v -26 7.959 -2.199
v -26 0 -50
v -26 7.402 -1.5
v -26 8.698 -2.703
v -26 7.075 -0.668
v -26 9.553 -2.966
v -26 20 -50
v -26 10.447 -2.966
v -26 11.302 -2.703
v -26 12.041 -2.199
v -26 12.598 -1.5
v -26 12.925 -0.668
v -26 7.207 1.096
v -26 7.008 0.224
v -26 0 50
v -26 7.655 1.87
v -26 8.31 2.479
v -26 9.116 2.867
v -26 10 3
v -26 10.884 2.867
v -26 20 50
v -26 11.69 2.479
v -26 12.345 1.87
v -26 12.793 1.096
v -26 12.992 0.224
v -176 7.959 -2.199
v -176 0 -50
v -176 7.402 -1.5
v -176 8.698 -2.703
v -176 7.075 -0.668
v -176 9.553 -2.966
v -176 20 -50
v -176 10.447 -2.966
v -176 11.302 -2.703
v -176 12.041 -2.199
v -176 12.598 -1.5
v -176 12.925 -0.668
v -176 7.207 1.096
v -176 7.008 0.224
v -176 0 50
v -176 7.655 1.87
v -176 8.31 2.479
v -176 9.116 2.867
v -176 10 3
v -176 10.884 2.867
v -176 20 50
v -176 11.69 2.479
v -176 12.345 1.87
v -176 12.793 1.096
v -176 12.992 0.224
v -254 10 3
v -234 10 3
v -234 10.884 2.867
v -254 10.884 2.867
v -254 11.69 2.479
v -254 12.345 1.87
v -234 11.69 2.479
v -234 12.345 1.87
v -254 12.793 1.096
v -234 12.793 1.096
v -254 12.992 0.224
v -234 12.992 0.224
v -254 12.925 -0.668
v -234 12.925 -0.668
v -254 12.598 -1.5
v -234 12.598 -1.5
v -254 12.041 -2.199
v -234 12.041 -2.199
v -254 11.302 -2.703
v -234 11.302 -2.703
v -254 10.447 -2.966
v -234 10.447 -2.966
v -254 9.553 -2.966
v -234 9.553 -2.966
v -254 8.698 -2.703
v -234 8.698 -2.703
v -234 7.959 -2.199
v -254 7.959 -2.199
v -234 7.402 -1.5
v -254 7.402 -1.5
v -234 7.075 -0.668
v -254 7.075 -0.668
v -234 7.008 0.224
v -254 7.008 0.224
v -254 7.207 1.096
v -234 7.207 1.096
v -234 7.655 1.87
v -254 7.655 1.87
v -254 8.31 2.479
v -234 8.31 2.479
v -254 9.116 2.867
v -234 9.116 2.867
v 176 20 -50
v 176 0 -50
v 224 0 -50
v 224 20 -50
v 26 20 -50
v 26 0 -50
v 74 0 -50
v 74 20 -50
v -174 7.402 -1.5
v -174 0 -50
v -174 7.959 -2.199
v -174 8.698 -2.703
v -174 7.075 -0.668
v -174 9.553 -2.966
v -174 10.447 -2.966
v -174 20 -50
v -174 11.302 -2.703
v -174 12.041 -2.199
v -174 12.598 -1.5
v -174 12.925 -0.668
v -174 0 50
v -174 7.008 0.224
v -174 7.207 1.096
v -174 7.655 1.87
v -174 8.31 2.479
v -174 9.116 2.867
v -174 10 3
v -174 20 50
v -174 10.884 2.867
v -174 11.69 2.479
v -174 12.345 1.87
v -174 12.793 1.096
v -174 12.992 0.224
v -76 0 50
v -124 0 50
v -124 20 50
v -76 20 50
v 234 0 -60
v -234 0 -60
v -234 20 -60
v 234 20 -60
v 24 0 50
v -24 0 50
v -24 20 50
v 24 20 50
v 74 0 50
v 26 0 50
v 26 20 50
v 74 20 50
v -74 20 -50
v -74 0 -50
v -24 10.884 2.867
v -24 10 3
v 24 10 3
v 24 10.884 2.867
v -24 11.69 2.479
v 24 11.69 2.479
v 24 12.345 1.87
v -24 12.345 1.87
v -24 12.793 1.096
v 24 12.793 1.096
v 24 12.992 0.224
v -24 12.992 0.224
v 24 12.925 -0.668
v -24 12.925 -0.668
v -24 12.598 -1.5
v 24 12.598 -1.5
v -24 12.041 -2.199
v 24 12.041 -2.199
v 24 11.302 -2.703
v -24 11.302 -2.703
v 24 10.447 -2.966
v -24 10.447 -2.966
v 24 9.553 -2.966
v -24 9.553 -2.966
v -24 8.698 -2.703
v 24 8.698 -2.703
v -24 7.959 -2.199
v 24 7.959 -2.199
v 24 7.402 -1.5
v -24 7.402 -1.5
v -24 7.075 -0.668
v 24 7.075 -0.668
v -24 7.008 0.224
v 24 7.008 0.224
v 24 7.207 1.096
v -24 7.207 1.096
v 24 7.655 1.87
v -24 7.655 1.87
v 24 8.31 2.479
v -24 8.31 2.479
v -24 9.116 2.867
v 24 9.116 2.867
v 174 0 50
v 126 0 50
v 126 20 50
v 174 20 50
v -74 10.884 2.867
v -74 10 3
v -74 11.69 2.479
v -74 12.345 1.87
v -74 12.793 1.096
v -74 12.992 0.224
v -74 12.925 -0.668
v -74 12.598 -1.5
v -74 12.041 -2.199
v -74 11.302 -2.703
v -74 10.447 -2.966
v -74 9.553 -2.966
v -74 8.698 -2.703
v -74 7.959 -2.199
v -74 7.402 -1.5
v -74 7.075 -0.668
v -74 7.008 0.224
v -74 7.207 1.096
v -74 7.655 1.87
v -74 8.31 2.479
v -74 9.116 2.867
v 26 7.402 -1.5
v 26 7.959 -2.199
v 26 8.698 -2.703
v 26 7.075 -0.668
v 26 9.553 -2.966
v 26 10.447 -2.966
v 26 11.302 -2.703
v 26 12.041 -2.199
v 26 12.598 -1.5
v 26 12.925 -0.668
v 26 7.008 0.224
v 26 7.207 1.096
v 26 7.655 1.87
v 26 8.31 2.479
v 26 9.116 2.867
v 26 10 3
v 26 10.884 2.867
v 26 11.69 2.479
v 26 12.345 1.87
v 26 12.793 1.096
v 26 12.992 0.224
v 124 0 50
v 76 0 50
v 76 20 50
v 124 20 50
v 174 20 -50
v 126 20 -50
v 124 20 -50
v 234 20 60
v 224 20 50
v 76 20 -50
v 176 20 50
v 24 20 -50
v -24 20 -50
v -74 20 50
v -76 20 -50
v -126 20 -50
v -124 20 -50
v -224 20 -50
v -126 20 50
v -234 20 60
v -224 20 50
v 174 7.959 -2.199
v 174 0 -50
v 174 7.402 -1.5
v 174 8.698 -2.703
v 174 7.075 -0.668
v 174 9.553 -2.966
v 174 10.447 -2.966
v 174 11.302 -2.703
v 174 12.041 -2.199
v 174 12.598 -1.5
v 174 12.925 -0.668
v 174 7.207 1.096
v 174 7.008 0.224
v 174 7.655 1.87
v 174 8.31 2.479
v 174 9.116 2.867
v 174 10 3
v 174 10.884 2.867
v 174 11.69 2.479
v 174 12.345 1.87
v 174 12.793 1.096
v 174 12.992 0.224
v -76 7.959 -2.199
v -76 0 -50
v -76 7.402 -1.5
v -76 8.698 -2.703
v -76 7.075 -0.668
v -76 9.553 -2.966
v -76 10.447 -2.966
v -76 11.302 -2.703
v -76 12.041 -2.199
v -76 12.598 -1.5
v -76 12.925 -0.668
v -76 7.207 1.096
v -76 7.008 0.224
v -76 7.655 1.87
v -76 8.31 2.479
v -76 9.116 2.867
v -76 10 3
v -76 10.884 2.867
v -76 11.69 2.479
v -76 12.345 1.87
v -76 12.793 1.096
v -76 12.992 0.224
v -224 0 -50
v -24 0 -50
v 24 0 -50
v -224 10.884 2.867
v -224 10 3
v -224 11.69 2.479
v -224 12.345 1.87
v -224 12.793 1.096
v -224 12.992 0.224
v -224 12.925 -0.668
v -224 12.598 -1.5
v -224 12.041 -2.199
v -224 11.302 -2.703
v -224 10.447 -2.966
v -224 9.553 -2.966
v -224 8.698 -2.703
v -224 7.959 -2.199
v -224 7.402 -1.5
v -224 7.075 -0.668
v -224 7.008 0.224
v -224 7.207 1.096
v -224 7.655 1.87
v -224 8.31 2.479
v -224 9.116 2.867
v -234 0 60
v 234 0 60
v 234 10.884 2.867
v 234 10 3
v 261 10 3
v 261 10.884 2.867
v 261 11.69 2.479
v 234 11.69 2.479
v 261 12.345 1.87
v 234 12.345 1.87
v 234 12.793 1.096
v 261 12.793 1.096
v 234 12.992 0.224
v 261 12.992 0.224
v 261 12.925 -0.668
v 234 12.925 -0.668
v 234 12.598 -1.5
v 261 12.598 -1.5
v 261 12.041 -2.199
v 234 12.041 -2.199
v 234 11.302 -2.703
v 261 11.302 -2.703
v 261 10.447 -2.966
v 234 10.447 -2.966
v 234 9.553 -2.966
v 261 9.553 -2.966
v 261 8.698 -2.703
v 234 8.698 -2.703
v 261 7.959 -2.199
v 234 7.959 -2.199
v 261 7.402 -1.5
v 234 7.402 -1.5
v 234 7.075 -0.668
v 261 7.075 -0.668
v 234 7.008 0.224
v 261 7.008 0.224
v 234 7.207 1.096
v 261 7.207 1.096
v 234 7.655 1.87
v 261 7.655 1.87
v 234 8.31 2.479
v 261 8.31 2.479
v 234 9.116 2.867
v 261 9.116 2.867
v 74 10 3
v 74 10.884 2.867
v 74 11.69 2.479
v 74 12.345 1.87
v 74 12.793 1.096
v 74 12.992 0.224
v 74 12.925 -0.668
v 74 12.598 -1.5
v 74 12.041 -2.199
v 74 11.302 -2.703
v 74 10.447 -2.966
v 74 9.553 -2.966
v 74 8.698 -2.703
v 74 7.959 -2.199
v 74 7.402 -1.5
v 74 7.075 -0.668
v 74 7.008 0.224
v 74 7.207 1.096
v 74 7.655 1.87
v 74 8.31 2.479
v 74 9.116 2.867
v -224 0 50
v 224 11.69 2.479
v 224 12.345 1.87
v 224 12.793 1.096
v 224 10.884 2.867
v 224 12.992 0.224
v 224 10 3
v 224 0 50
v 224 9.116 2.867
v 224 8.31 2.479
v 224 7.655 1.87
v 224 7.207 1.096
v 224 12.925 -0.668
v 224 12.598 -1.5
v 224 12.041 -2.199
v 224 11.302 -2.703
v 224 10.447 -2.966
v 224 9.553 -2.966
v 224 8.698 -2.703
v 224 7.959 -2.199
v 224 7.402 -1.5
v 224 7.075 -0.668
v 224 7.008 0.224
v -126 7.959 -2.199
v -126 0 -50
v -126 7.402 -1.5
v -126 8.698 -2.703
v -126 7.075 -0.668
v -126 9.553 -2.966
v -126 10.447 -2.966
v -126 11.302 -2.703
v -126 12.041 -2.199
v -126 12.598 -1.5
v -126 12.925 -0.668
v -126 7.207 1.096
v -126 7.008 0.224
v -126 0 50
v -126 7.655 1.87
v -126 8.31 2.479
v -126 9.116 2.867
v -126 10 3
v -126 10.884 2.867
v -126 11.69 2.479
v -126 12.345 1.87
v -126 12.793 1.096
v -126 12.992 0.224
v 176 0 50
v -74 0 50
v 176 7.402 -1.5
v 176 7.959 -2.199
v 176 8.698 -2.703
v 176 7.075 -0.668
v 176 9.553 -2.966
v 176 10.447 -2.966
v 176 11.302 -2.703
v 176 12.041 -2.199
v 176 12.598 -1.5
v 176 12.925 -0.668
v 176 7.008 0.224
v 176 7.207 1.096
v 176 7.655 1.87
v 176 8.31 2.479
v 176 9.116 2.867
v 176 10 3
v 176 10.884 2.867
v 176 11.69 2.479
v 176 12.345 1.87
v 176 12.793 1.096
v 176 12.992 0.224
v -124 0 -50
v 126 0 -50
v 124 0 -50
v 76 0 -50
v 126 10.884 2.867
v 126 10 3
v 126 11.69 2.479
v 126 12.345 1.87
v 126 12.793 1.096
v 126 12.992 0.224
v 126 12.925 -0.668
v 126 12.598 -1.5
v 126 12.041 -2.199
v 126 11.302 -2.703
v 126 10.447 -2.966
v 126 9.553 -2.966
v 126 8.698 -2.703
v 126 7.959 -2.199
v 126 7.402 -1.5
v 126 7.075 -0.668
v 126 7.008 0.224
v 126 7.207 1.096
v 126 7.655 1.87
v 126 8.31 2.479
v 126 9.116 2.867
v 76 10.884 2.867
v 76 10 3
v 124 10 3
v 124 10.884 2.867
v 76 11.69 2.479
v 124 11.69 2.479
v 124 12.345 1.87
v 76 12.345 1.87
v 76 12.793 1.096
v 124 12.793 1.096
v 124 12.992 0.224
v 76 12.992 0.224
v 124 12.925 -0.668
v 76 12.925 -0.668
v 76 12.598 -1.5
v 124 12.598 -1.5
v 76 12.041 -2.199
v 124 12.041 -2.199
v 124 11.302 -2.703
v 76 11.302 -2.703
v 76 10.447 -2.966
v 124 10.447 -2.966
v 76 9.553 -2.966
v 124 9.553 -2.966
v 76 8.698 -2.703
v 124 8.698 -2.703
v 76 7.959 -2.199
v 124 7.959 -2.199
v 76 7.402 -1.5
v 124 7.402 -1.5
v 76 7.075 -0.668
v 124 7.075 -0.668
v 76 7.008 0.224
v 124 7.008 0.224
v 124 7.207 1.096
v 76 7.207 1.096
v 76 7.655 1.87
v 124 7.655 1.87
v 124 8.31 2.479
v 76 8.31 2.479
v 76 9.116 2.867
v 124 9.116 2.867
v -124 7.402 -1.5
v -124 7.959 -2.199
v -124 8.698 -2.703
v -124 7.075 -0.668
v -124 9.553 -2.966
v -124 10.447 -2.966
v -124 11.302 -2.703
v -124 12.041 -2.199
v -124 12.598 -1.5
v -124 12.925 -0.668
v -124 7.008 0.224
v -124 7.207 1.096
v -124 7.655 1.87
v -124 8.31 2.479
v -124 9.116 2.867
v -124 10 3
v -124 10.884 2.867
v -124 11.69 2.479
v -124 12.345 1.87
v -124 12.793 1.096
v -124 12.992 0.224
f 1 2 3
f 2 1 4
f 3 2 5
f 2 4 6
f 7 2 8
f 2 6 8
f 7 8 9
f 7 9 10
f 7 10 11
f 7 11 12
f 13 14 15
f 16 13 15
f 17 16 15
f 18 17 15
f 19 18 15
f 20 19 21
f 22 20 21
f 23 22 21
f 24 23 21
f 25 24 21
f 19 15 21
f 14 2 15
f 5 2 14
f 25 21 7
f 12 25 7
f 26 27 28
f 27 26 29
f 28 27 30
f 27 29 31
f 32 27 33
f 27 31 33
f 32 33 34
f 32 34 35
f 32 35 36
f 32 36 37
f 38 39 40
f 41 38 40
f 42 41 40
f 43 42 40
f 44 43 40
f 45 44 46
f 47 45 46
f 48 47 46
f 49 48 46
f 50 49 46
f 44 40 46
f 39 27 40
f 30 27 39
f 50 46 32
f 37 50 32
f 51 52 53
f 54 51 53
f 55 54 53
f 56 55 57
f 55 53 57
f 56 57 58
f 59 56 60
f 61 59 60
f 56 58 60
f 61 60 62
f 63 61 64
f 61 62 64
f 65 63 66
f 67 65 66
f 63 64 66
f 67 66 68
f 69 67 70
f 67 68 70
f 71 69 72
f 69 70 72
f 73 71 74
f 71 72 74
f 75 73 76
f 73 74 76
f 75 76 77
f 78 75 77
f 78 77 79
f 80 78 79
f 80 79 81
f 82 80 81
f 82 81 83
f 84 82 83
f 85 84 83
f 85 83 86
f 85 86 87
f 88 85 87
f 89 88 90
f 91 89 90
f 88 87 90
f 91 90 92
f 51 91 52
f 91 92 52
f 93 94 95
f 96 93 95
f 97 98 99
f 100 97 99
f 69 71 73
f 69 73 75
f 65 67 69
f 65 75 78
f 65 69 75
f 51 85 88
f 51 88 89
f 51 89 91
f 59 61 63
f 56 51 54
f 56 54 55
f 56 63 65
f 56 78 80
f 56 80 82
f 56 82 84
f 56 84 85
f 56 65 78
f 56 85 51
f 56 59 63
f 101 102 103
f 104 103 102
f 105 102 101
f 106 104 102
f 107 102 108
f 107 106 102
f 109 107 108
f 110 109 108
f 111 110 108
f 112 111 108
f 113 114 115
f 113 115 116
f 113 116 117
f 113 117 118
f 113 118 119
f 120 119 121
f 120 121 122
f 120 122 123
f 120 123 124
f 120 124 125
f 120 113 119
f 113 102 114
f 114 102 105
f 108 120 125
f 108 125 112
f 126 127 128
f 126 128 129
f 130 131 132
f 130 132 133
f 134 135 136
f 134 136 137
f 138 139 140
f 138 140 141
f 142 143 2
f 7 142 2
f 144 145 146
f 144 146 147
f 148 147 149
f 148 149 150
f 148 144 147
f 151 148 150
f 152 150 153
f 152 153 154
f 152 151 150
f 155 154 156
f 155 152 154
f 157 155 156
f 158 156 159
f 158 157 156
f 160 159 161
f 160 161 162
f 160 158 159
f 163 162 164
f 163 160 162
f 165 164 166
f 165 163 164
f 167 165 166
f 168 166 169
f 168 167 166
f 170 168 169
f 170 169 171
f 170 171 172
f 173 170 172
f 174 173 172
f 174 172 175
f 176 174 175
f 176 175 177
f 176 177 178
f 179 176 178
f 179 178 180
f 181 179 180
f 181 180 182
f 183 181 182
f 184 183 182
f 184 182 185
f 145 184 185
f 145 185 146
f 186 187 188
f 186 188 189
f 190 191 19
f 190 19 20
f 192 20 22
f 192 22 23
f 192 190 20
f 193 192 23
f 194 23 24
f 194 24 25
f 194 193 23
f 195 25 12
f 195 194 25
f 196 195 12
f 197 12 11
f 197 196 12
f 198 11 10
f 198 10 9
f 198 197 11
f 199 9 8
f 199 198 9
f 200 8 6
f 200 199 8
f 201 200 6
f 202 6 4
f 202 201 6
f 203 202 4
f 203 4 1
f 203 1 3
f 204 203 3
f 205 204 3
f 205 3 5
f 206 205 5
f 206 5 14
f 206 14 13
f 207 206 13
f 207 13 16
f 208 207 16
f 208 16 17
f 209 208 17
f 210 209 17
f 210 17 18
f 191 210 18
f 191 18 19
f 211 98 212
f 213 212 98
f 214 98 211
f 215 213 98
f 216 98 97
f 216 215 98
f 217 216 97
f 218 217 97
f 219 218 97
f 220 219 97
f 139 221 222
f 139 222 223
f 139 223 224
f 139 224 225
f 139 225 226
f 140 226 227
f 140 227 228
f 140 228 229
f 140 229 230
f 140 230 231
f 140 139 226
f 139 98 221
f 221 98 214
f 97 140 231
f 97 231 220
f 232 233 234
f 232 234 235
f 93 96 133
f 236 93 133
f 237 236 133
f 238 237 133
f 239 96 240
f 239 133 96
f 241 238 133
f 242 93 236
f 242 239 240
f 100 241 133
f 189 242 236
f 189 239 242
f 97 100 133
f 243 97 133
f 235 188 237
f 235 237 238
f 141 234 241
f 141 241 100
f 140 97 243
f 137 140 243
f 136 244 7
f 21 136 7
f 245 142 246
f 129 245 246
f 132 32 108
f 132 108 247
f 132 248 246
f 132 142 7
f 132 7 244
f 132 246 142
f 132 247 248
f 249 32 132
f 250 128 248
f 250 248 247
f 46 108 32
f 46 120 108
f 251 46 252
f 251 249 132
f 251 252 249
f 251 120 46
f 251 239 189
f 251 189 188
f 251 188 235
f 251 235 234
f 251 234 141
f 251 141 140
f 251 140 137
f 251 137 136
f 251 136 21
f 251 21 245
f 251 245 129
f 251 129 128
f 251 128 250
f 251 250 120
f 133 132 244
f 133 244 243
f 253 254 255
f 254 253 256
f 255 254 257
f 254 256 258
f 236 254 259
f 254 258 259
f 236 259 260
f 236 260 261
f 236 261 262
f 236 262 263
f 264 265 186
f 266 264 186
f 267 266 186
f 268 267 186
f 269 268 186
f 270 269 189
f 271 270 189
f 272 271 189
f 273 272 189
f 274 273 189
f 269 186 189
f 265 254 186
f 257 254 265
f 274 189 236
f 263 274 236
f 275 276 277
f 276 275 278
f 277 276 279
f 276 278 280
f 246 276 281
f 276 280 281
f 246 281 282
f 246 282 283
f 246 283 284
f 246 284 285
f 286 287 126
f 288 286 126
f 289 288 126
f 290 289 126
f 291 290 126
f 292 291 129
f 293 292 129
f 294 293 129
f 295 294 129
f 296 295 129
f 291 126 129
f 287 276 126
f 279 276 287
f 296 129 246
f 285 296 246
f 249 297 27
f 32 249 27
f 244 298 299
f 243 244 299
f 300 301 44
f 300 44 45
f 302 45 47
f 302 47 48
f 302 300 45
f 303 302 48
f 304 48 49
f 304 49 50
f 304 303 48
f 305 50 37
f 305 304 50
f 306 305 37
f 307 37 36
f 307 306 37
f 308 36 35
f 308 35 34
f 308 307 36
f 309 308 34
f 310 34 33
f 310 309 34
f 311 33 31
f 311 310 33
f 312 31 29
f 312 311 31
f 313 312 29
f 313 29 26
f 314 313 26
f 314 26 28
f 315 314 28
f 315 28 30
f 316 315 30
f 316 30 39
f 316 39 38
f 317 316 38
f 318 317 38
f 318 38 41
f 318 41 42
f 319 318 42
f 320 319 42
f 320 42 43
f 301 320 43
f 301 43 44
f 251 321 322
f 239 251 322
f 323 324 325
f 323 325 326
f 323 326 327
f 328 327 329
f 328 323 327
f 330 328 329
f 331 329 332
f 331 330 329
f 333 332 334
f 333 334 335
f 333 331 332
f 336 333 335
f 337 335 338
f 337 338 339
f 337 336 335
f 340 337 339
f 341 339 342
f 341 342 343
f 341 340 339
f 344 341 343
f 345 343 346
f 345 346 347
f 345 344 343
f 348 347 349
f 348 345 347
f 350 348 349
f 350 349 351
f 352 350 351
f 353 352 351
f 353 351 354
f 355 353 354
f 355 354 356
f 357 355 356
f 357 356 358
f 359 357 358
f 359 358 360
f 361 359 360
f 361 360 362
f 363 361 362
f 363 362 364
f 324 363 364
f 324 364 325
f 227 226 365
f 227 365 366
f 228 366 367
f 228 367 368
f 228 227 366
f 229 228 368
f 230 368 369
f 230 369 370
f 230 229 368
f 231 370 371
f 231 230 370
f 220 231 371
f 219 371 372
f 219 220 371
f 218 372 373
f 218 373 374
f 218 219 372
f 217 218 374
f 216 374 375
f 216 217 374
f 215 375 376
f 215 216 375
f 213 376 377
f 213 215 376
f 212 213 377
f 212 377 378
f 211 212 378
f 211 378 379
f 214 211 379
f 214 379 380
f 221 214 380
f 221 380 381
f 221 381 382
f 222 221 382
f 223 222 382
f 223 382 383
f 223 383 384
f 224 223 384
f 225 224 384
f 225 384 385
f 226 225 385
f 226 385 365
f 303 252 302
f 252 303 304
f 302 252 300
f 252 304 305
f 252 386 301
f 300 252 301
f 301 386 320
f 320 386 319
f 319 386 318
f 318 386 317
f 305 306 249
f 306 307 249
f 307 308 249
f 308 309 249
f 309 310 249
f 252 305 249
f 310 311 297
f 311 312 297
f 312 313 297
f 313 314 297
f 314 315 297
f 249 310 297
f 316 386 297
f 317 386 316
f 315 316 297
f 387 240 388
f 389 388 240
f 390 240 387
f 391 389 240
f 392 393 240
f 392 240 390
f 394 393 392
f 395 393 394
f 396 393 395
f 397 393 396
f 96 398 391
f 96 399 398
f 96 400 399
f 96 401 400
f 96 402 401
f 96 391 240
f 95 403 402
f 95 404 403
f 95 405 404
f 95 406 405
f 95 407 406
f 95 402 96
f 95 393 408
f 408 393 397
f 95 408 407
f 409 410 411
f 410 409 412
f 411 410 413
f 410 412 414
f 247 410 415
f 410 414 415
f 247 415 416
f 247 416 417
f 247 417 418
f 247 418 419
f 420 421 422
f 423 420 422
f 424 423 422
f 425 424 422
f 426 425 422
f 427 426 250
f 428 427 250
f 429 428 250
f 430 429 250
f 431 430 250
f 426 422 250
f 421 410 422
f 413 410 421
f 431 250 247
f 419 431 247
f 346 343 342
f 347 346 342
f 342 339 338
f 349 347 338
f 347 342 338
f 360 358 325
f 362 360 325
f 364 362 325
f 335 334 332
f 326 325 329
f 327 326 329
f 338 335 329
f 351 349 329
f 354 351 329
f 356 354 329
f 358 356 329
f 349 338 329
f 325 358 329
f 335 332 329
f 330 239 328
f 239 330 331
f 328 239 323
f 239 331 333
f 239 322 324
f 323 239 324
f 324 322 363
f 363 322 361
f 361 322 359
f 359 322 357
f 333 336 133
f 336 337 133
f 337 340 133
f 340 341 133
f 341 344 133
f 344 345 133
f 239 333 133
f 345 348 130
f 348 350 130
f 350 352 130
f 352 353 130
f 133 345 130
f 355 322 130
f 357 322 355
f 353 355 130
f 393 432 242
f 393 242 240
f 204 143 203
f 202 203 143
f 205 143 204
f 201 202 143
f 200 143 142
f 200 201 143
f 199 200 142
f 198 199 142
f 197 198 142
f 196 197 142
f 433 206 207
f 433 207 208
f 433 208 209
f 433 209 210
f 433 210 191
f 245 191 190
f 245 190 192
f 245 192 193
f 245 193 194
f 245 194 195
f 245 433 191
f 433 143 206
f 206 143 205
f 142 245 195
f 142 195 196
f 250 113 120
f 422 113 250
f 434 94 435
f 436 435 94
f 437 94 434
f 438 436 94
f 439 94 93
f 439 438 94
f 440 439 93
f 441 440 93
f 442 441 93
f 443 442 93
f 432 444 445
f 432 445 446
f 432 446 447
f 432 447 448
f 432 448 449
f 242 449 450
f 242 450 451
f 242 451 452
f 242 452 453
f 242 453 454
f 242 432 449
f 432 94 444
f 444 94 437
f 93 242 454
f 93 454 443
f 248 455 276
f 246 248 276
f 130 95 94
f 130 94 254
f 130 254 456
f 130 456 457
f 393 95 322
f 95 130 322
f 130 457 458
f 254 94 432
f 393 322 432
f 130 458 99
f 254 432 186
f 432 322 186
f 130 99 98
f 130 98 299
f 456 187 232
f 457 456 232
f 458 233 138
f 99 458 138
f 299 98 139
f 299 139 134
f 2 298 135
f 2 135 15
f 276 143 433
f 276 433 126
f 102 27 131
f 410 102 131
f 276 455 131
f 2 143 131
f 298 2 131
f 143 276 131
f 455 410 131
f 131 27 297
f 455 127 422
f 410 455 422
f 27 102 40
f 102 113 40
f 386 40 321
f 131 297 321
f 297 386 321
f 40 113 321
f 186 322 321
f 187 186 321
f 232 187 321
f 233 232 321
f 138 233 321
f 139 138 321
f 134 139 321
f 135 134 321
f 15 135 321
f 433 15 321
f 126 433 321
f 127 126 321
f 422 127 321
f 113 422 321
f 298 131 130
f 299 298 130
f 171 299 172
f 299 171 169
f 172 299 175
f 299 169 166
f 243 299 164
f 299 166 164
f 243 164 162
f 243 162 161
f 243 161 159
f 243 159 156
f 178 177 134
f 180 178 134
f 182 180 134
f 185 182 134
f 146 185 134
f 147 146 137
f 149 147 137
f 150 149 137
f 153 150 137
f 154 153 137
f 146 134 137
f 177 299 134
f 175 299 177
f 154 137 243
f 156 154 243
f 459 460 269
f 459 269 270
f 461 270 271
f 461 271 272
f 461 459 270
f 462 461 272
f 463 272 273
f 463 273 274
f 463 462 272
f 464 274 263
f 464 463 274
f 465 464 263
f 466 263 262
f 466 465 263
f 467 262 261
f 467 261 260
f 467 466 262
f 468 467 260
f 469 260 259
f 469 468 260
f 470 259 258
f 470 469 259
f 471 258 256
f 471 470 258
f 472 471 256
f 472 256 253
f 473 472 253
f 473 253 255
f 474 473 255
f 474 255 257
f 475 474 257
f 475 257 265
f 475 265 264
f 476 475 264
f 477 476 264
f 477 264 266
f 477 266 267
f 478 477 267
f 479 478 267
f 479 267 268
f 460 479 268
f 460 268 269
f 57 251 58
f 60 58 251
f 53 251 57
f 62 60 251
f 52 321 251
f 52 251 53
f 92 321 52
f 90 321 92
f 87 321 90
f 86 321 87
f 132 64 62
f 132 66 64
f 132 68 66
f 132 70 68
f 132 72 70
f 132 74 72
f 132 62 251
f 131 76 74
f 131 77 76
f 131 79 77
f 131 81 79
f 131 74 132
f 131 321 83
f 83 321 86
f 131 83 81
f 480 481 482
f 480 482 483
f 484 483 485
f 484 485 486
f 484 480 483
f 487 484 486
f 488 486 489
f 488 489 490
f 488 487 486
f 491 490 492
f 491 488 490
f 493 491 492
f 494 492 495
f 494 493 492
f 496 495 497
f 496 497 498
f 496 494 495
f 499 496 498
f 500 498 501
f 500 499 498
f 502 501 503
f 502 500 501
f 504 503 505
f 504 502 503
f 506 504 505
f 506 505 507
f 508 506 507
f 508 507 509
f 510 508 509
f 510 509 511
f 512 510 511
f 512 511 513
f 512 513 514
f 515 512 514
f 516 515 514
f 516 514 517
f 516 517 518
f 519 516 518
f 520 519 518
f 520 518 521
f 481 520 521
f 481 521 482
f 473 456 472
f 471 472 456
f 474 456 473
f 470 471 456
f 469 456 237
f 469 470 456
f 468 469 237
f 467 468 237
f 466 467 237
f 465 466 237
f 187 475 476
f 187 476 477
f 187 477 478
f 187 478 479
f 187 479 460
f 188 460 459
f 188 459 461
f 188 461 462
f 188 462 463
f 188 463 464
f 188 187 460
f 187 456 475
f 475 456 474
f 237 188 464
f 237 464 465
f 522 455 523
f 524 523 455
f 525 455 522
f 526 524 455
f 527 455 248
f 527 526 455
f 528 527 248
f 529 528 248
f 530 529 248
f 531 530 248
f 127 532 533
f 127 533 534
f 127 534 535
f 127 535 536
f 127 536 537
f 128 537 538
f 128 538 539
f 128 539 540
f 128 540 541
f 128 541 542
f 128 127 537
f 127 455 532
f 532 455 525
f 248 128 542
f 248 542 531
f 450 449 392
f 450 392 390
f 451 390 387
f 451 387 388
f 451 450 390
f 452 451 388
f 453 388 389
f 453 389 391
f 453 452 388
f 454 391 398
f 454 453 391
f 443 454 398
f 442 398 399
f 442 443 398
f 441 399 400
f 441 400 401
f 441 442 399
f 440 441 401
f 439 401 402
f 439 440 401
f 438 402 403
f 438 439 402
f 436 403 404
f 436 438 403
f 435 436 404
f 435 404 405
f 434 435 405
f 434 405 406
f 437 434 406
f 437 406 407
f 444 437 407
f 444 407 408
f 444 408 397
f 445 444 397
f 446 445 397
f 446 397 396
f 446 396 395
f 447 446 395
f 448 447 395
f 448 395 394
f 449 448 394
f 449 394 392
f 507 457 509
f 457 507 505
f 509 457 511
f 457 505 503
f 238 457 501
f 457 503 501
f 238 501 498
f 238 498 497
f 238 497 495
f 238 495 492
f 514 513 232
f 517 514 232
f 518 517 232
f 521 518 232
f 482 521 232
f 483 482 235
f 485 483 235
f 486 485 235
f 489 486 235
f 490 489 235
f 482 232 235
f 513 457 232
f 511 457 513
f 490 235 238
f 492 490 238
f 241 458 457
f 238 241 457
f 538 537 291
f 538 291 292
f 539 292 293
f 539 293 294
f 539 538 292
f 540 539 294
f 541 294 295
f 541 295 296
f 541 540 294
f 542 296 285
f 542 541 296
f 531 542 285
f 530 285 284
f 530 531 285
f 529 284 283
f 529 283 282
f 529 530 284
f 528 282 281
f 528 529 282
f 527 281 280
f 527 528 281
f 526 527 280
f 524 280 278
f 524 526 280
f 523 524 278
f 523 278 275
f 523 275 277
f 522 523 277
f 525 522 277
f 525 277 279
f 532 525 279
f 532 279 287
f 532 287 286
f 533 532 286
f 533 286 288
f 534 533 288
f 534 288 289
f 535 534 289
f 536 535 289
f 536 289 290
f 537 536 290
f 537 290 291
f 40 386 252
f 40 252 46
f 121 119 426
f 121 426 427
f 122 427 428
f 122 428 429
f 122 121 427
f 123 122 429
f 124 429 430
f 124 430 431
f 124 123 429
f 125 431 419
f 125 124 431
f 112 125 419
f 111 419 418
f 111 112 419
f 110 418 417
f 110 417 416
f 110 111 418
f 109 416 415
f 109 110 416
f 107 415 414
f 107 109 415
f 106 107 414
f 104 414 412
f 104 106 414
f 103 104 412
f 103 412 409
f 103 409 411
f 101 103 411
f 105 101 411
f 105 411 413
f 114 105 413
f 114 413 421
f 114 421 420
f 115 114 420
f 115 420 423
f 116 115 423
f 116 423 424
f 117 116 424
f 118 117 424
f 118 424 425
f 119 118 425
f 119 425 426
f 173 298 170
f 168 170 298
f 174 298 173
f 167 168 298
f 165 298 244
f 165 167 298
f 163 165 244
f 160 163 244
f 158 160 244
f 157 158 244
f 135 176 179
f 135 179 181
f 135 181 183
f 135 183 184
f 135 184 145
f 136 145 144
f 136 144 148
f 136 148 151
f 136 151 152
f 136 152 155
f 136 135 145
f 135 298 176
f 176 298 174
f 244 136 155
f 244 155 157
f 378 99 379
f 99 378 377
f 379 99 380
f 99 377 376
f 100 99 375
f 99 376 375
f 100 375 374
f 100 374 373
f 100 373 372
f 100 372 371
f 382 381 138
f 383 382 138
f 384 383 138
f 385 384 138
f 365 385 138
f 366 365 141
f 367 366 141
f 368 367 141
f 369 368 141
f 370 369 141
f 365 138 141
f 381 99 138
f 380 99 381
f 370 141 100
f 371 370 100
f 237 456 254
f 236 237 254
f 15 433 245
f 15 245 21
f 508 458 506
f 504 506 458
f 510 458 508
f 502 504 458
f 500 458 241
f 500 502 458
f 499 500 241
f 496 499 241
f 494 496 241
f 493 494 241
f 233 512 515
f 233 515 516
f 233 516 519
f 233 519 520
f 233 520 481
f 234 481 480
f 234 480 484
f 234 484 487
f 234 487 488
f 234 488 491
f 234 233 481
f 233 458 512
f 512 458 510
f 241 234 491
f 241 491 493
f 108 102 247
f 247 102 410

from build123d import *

# Parameters (mm, degrees)
SKETCH1_W                = 468
SKETCH1_H                = 120
SKETCH1_W_2              = 448
SKETCH1_H_2              = 100
BOSS_EXTRUDE1_DEPTH      = 20
SKETCH2_R                = 3
BOSS_EXTRUDE2_DEPTH      = 20
BOSS_EXTRUDE2_DEPTH_BACK = 495
SKETCH4_W                = 2
SKETCH4_H                = 20
BOSS_EXTRUDE3_DEPTH      = 100


with BuildPart() as part:
    # Sketch1 → Boss-Extrude1 (new body)
    with BuildSketch(Plane(origin=(0, 0, 0), x_dir=(1, 0, 0), z_dir=(0, 1, 0))):
        Rectangle(SKETCH1_W, SKETCH1_H)
        Rectangle(SKETCH1_W_2, SKETCH1_H_2, mode=Mode.SUBTRACT)
    extrude(amount=BOSS_EXTRUDE1_DEPTH)

    # Sketch2 → Boss-Extrude2 (add, two sides)
    with BuildSketch(Plane.ZY.offset(234)) as boss_extrude2_sk:
        with Locations((0, 10)):
            Circle(SKETCH2_R)
    extrude(amount=BOSS_EXTRUDE2_DEPTH)
    extrude(boss_extrude2_sk.sketch, amount=-BOSS_EXTRUDE2_DEPTH_BACK)

    # Sketch4 → Boss-Extrude3 (add)
    with BuildSketch(Plane(origin=(0, 0, 50), x_dir=(-1, 0, 0), z_dir=(0, 0, -1))):
        with Locations((-125, 10)):
            Rectangle(SKETCH4_W, SKETCH4_H)
        with Locations((-75, 10)):
            Rectangle(SKETCH4_W, SKETCH4_H)
        with Locations((-25, 10)):
            Rectangle(SKETCH4_W, SKETCH4_H)
        with Locations((25, 10)):
            Rectangle(SKETCH4_W, SKETCH4_H)
        with Locations((75, 10)):
            Rectangle(SKETCH4_W, SKETCH4_H)
        with Locations((125, 10)):
            Rectangle(SKETCH4_W, SKETCH4_H)
        with Locations((175, 10)):
            Rectangle(SKETCH4_W, SKETCH4_H)
        with Locations((-175, 10)):
            Rectangle(SKETCH4_W, SKETCH4_H)
    extrude(amount=BOSS_EXTRUDE3_DEPTH)


solid = part.part
